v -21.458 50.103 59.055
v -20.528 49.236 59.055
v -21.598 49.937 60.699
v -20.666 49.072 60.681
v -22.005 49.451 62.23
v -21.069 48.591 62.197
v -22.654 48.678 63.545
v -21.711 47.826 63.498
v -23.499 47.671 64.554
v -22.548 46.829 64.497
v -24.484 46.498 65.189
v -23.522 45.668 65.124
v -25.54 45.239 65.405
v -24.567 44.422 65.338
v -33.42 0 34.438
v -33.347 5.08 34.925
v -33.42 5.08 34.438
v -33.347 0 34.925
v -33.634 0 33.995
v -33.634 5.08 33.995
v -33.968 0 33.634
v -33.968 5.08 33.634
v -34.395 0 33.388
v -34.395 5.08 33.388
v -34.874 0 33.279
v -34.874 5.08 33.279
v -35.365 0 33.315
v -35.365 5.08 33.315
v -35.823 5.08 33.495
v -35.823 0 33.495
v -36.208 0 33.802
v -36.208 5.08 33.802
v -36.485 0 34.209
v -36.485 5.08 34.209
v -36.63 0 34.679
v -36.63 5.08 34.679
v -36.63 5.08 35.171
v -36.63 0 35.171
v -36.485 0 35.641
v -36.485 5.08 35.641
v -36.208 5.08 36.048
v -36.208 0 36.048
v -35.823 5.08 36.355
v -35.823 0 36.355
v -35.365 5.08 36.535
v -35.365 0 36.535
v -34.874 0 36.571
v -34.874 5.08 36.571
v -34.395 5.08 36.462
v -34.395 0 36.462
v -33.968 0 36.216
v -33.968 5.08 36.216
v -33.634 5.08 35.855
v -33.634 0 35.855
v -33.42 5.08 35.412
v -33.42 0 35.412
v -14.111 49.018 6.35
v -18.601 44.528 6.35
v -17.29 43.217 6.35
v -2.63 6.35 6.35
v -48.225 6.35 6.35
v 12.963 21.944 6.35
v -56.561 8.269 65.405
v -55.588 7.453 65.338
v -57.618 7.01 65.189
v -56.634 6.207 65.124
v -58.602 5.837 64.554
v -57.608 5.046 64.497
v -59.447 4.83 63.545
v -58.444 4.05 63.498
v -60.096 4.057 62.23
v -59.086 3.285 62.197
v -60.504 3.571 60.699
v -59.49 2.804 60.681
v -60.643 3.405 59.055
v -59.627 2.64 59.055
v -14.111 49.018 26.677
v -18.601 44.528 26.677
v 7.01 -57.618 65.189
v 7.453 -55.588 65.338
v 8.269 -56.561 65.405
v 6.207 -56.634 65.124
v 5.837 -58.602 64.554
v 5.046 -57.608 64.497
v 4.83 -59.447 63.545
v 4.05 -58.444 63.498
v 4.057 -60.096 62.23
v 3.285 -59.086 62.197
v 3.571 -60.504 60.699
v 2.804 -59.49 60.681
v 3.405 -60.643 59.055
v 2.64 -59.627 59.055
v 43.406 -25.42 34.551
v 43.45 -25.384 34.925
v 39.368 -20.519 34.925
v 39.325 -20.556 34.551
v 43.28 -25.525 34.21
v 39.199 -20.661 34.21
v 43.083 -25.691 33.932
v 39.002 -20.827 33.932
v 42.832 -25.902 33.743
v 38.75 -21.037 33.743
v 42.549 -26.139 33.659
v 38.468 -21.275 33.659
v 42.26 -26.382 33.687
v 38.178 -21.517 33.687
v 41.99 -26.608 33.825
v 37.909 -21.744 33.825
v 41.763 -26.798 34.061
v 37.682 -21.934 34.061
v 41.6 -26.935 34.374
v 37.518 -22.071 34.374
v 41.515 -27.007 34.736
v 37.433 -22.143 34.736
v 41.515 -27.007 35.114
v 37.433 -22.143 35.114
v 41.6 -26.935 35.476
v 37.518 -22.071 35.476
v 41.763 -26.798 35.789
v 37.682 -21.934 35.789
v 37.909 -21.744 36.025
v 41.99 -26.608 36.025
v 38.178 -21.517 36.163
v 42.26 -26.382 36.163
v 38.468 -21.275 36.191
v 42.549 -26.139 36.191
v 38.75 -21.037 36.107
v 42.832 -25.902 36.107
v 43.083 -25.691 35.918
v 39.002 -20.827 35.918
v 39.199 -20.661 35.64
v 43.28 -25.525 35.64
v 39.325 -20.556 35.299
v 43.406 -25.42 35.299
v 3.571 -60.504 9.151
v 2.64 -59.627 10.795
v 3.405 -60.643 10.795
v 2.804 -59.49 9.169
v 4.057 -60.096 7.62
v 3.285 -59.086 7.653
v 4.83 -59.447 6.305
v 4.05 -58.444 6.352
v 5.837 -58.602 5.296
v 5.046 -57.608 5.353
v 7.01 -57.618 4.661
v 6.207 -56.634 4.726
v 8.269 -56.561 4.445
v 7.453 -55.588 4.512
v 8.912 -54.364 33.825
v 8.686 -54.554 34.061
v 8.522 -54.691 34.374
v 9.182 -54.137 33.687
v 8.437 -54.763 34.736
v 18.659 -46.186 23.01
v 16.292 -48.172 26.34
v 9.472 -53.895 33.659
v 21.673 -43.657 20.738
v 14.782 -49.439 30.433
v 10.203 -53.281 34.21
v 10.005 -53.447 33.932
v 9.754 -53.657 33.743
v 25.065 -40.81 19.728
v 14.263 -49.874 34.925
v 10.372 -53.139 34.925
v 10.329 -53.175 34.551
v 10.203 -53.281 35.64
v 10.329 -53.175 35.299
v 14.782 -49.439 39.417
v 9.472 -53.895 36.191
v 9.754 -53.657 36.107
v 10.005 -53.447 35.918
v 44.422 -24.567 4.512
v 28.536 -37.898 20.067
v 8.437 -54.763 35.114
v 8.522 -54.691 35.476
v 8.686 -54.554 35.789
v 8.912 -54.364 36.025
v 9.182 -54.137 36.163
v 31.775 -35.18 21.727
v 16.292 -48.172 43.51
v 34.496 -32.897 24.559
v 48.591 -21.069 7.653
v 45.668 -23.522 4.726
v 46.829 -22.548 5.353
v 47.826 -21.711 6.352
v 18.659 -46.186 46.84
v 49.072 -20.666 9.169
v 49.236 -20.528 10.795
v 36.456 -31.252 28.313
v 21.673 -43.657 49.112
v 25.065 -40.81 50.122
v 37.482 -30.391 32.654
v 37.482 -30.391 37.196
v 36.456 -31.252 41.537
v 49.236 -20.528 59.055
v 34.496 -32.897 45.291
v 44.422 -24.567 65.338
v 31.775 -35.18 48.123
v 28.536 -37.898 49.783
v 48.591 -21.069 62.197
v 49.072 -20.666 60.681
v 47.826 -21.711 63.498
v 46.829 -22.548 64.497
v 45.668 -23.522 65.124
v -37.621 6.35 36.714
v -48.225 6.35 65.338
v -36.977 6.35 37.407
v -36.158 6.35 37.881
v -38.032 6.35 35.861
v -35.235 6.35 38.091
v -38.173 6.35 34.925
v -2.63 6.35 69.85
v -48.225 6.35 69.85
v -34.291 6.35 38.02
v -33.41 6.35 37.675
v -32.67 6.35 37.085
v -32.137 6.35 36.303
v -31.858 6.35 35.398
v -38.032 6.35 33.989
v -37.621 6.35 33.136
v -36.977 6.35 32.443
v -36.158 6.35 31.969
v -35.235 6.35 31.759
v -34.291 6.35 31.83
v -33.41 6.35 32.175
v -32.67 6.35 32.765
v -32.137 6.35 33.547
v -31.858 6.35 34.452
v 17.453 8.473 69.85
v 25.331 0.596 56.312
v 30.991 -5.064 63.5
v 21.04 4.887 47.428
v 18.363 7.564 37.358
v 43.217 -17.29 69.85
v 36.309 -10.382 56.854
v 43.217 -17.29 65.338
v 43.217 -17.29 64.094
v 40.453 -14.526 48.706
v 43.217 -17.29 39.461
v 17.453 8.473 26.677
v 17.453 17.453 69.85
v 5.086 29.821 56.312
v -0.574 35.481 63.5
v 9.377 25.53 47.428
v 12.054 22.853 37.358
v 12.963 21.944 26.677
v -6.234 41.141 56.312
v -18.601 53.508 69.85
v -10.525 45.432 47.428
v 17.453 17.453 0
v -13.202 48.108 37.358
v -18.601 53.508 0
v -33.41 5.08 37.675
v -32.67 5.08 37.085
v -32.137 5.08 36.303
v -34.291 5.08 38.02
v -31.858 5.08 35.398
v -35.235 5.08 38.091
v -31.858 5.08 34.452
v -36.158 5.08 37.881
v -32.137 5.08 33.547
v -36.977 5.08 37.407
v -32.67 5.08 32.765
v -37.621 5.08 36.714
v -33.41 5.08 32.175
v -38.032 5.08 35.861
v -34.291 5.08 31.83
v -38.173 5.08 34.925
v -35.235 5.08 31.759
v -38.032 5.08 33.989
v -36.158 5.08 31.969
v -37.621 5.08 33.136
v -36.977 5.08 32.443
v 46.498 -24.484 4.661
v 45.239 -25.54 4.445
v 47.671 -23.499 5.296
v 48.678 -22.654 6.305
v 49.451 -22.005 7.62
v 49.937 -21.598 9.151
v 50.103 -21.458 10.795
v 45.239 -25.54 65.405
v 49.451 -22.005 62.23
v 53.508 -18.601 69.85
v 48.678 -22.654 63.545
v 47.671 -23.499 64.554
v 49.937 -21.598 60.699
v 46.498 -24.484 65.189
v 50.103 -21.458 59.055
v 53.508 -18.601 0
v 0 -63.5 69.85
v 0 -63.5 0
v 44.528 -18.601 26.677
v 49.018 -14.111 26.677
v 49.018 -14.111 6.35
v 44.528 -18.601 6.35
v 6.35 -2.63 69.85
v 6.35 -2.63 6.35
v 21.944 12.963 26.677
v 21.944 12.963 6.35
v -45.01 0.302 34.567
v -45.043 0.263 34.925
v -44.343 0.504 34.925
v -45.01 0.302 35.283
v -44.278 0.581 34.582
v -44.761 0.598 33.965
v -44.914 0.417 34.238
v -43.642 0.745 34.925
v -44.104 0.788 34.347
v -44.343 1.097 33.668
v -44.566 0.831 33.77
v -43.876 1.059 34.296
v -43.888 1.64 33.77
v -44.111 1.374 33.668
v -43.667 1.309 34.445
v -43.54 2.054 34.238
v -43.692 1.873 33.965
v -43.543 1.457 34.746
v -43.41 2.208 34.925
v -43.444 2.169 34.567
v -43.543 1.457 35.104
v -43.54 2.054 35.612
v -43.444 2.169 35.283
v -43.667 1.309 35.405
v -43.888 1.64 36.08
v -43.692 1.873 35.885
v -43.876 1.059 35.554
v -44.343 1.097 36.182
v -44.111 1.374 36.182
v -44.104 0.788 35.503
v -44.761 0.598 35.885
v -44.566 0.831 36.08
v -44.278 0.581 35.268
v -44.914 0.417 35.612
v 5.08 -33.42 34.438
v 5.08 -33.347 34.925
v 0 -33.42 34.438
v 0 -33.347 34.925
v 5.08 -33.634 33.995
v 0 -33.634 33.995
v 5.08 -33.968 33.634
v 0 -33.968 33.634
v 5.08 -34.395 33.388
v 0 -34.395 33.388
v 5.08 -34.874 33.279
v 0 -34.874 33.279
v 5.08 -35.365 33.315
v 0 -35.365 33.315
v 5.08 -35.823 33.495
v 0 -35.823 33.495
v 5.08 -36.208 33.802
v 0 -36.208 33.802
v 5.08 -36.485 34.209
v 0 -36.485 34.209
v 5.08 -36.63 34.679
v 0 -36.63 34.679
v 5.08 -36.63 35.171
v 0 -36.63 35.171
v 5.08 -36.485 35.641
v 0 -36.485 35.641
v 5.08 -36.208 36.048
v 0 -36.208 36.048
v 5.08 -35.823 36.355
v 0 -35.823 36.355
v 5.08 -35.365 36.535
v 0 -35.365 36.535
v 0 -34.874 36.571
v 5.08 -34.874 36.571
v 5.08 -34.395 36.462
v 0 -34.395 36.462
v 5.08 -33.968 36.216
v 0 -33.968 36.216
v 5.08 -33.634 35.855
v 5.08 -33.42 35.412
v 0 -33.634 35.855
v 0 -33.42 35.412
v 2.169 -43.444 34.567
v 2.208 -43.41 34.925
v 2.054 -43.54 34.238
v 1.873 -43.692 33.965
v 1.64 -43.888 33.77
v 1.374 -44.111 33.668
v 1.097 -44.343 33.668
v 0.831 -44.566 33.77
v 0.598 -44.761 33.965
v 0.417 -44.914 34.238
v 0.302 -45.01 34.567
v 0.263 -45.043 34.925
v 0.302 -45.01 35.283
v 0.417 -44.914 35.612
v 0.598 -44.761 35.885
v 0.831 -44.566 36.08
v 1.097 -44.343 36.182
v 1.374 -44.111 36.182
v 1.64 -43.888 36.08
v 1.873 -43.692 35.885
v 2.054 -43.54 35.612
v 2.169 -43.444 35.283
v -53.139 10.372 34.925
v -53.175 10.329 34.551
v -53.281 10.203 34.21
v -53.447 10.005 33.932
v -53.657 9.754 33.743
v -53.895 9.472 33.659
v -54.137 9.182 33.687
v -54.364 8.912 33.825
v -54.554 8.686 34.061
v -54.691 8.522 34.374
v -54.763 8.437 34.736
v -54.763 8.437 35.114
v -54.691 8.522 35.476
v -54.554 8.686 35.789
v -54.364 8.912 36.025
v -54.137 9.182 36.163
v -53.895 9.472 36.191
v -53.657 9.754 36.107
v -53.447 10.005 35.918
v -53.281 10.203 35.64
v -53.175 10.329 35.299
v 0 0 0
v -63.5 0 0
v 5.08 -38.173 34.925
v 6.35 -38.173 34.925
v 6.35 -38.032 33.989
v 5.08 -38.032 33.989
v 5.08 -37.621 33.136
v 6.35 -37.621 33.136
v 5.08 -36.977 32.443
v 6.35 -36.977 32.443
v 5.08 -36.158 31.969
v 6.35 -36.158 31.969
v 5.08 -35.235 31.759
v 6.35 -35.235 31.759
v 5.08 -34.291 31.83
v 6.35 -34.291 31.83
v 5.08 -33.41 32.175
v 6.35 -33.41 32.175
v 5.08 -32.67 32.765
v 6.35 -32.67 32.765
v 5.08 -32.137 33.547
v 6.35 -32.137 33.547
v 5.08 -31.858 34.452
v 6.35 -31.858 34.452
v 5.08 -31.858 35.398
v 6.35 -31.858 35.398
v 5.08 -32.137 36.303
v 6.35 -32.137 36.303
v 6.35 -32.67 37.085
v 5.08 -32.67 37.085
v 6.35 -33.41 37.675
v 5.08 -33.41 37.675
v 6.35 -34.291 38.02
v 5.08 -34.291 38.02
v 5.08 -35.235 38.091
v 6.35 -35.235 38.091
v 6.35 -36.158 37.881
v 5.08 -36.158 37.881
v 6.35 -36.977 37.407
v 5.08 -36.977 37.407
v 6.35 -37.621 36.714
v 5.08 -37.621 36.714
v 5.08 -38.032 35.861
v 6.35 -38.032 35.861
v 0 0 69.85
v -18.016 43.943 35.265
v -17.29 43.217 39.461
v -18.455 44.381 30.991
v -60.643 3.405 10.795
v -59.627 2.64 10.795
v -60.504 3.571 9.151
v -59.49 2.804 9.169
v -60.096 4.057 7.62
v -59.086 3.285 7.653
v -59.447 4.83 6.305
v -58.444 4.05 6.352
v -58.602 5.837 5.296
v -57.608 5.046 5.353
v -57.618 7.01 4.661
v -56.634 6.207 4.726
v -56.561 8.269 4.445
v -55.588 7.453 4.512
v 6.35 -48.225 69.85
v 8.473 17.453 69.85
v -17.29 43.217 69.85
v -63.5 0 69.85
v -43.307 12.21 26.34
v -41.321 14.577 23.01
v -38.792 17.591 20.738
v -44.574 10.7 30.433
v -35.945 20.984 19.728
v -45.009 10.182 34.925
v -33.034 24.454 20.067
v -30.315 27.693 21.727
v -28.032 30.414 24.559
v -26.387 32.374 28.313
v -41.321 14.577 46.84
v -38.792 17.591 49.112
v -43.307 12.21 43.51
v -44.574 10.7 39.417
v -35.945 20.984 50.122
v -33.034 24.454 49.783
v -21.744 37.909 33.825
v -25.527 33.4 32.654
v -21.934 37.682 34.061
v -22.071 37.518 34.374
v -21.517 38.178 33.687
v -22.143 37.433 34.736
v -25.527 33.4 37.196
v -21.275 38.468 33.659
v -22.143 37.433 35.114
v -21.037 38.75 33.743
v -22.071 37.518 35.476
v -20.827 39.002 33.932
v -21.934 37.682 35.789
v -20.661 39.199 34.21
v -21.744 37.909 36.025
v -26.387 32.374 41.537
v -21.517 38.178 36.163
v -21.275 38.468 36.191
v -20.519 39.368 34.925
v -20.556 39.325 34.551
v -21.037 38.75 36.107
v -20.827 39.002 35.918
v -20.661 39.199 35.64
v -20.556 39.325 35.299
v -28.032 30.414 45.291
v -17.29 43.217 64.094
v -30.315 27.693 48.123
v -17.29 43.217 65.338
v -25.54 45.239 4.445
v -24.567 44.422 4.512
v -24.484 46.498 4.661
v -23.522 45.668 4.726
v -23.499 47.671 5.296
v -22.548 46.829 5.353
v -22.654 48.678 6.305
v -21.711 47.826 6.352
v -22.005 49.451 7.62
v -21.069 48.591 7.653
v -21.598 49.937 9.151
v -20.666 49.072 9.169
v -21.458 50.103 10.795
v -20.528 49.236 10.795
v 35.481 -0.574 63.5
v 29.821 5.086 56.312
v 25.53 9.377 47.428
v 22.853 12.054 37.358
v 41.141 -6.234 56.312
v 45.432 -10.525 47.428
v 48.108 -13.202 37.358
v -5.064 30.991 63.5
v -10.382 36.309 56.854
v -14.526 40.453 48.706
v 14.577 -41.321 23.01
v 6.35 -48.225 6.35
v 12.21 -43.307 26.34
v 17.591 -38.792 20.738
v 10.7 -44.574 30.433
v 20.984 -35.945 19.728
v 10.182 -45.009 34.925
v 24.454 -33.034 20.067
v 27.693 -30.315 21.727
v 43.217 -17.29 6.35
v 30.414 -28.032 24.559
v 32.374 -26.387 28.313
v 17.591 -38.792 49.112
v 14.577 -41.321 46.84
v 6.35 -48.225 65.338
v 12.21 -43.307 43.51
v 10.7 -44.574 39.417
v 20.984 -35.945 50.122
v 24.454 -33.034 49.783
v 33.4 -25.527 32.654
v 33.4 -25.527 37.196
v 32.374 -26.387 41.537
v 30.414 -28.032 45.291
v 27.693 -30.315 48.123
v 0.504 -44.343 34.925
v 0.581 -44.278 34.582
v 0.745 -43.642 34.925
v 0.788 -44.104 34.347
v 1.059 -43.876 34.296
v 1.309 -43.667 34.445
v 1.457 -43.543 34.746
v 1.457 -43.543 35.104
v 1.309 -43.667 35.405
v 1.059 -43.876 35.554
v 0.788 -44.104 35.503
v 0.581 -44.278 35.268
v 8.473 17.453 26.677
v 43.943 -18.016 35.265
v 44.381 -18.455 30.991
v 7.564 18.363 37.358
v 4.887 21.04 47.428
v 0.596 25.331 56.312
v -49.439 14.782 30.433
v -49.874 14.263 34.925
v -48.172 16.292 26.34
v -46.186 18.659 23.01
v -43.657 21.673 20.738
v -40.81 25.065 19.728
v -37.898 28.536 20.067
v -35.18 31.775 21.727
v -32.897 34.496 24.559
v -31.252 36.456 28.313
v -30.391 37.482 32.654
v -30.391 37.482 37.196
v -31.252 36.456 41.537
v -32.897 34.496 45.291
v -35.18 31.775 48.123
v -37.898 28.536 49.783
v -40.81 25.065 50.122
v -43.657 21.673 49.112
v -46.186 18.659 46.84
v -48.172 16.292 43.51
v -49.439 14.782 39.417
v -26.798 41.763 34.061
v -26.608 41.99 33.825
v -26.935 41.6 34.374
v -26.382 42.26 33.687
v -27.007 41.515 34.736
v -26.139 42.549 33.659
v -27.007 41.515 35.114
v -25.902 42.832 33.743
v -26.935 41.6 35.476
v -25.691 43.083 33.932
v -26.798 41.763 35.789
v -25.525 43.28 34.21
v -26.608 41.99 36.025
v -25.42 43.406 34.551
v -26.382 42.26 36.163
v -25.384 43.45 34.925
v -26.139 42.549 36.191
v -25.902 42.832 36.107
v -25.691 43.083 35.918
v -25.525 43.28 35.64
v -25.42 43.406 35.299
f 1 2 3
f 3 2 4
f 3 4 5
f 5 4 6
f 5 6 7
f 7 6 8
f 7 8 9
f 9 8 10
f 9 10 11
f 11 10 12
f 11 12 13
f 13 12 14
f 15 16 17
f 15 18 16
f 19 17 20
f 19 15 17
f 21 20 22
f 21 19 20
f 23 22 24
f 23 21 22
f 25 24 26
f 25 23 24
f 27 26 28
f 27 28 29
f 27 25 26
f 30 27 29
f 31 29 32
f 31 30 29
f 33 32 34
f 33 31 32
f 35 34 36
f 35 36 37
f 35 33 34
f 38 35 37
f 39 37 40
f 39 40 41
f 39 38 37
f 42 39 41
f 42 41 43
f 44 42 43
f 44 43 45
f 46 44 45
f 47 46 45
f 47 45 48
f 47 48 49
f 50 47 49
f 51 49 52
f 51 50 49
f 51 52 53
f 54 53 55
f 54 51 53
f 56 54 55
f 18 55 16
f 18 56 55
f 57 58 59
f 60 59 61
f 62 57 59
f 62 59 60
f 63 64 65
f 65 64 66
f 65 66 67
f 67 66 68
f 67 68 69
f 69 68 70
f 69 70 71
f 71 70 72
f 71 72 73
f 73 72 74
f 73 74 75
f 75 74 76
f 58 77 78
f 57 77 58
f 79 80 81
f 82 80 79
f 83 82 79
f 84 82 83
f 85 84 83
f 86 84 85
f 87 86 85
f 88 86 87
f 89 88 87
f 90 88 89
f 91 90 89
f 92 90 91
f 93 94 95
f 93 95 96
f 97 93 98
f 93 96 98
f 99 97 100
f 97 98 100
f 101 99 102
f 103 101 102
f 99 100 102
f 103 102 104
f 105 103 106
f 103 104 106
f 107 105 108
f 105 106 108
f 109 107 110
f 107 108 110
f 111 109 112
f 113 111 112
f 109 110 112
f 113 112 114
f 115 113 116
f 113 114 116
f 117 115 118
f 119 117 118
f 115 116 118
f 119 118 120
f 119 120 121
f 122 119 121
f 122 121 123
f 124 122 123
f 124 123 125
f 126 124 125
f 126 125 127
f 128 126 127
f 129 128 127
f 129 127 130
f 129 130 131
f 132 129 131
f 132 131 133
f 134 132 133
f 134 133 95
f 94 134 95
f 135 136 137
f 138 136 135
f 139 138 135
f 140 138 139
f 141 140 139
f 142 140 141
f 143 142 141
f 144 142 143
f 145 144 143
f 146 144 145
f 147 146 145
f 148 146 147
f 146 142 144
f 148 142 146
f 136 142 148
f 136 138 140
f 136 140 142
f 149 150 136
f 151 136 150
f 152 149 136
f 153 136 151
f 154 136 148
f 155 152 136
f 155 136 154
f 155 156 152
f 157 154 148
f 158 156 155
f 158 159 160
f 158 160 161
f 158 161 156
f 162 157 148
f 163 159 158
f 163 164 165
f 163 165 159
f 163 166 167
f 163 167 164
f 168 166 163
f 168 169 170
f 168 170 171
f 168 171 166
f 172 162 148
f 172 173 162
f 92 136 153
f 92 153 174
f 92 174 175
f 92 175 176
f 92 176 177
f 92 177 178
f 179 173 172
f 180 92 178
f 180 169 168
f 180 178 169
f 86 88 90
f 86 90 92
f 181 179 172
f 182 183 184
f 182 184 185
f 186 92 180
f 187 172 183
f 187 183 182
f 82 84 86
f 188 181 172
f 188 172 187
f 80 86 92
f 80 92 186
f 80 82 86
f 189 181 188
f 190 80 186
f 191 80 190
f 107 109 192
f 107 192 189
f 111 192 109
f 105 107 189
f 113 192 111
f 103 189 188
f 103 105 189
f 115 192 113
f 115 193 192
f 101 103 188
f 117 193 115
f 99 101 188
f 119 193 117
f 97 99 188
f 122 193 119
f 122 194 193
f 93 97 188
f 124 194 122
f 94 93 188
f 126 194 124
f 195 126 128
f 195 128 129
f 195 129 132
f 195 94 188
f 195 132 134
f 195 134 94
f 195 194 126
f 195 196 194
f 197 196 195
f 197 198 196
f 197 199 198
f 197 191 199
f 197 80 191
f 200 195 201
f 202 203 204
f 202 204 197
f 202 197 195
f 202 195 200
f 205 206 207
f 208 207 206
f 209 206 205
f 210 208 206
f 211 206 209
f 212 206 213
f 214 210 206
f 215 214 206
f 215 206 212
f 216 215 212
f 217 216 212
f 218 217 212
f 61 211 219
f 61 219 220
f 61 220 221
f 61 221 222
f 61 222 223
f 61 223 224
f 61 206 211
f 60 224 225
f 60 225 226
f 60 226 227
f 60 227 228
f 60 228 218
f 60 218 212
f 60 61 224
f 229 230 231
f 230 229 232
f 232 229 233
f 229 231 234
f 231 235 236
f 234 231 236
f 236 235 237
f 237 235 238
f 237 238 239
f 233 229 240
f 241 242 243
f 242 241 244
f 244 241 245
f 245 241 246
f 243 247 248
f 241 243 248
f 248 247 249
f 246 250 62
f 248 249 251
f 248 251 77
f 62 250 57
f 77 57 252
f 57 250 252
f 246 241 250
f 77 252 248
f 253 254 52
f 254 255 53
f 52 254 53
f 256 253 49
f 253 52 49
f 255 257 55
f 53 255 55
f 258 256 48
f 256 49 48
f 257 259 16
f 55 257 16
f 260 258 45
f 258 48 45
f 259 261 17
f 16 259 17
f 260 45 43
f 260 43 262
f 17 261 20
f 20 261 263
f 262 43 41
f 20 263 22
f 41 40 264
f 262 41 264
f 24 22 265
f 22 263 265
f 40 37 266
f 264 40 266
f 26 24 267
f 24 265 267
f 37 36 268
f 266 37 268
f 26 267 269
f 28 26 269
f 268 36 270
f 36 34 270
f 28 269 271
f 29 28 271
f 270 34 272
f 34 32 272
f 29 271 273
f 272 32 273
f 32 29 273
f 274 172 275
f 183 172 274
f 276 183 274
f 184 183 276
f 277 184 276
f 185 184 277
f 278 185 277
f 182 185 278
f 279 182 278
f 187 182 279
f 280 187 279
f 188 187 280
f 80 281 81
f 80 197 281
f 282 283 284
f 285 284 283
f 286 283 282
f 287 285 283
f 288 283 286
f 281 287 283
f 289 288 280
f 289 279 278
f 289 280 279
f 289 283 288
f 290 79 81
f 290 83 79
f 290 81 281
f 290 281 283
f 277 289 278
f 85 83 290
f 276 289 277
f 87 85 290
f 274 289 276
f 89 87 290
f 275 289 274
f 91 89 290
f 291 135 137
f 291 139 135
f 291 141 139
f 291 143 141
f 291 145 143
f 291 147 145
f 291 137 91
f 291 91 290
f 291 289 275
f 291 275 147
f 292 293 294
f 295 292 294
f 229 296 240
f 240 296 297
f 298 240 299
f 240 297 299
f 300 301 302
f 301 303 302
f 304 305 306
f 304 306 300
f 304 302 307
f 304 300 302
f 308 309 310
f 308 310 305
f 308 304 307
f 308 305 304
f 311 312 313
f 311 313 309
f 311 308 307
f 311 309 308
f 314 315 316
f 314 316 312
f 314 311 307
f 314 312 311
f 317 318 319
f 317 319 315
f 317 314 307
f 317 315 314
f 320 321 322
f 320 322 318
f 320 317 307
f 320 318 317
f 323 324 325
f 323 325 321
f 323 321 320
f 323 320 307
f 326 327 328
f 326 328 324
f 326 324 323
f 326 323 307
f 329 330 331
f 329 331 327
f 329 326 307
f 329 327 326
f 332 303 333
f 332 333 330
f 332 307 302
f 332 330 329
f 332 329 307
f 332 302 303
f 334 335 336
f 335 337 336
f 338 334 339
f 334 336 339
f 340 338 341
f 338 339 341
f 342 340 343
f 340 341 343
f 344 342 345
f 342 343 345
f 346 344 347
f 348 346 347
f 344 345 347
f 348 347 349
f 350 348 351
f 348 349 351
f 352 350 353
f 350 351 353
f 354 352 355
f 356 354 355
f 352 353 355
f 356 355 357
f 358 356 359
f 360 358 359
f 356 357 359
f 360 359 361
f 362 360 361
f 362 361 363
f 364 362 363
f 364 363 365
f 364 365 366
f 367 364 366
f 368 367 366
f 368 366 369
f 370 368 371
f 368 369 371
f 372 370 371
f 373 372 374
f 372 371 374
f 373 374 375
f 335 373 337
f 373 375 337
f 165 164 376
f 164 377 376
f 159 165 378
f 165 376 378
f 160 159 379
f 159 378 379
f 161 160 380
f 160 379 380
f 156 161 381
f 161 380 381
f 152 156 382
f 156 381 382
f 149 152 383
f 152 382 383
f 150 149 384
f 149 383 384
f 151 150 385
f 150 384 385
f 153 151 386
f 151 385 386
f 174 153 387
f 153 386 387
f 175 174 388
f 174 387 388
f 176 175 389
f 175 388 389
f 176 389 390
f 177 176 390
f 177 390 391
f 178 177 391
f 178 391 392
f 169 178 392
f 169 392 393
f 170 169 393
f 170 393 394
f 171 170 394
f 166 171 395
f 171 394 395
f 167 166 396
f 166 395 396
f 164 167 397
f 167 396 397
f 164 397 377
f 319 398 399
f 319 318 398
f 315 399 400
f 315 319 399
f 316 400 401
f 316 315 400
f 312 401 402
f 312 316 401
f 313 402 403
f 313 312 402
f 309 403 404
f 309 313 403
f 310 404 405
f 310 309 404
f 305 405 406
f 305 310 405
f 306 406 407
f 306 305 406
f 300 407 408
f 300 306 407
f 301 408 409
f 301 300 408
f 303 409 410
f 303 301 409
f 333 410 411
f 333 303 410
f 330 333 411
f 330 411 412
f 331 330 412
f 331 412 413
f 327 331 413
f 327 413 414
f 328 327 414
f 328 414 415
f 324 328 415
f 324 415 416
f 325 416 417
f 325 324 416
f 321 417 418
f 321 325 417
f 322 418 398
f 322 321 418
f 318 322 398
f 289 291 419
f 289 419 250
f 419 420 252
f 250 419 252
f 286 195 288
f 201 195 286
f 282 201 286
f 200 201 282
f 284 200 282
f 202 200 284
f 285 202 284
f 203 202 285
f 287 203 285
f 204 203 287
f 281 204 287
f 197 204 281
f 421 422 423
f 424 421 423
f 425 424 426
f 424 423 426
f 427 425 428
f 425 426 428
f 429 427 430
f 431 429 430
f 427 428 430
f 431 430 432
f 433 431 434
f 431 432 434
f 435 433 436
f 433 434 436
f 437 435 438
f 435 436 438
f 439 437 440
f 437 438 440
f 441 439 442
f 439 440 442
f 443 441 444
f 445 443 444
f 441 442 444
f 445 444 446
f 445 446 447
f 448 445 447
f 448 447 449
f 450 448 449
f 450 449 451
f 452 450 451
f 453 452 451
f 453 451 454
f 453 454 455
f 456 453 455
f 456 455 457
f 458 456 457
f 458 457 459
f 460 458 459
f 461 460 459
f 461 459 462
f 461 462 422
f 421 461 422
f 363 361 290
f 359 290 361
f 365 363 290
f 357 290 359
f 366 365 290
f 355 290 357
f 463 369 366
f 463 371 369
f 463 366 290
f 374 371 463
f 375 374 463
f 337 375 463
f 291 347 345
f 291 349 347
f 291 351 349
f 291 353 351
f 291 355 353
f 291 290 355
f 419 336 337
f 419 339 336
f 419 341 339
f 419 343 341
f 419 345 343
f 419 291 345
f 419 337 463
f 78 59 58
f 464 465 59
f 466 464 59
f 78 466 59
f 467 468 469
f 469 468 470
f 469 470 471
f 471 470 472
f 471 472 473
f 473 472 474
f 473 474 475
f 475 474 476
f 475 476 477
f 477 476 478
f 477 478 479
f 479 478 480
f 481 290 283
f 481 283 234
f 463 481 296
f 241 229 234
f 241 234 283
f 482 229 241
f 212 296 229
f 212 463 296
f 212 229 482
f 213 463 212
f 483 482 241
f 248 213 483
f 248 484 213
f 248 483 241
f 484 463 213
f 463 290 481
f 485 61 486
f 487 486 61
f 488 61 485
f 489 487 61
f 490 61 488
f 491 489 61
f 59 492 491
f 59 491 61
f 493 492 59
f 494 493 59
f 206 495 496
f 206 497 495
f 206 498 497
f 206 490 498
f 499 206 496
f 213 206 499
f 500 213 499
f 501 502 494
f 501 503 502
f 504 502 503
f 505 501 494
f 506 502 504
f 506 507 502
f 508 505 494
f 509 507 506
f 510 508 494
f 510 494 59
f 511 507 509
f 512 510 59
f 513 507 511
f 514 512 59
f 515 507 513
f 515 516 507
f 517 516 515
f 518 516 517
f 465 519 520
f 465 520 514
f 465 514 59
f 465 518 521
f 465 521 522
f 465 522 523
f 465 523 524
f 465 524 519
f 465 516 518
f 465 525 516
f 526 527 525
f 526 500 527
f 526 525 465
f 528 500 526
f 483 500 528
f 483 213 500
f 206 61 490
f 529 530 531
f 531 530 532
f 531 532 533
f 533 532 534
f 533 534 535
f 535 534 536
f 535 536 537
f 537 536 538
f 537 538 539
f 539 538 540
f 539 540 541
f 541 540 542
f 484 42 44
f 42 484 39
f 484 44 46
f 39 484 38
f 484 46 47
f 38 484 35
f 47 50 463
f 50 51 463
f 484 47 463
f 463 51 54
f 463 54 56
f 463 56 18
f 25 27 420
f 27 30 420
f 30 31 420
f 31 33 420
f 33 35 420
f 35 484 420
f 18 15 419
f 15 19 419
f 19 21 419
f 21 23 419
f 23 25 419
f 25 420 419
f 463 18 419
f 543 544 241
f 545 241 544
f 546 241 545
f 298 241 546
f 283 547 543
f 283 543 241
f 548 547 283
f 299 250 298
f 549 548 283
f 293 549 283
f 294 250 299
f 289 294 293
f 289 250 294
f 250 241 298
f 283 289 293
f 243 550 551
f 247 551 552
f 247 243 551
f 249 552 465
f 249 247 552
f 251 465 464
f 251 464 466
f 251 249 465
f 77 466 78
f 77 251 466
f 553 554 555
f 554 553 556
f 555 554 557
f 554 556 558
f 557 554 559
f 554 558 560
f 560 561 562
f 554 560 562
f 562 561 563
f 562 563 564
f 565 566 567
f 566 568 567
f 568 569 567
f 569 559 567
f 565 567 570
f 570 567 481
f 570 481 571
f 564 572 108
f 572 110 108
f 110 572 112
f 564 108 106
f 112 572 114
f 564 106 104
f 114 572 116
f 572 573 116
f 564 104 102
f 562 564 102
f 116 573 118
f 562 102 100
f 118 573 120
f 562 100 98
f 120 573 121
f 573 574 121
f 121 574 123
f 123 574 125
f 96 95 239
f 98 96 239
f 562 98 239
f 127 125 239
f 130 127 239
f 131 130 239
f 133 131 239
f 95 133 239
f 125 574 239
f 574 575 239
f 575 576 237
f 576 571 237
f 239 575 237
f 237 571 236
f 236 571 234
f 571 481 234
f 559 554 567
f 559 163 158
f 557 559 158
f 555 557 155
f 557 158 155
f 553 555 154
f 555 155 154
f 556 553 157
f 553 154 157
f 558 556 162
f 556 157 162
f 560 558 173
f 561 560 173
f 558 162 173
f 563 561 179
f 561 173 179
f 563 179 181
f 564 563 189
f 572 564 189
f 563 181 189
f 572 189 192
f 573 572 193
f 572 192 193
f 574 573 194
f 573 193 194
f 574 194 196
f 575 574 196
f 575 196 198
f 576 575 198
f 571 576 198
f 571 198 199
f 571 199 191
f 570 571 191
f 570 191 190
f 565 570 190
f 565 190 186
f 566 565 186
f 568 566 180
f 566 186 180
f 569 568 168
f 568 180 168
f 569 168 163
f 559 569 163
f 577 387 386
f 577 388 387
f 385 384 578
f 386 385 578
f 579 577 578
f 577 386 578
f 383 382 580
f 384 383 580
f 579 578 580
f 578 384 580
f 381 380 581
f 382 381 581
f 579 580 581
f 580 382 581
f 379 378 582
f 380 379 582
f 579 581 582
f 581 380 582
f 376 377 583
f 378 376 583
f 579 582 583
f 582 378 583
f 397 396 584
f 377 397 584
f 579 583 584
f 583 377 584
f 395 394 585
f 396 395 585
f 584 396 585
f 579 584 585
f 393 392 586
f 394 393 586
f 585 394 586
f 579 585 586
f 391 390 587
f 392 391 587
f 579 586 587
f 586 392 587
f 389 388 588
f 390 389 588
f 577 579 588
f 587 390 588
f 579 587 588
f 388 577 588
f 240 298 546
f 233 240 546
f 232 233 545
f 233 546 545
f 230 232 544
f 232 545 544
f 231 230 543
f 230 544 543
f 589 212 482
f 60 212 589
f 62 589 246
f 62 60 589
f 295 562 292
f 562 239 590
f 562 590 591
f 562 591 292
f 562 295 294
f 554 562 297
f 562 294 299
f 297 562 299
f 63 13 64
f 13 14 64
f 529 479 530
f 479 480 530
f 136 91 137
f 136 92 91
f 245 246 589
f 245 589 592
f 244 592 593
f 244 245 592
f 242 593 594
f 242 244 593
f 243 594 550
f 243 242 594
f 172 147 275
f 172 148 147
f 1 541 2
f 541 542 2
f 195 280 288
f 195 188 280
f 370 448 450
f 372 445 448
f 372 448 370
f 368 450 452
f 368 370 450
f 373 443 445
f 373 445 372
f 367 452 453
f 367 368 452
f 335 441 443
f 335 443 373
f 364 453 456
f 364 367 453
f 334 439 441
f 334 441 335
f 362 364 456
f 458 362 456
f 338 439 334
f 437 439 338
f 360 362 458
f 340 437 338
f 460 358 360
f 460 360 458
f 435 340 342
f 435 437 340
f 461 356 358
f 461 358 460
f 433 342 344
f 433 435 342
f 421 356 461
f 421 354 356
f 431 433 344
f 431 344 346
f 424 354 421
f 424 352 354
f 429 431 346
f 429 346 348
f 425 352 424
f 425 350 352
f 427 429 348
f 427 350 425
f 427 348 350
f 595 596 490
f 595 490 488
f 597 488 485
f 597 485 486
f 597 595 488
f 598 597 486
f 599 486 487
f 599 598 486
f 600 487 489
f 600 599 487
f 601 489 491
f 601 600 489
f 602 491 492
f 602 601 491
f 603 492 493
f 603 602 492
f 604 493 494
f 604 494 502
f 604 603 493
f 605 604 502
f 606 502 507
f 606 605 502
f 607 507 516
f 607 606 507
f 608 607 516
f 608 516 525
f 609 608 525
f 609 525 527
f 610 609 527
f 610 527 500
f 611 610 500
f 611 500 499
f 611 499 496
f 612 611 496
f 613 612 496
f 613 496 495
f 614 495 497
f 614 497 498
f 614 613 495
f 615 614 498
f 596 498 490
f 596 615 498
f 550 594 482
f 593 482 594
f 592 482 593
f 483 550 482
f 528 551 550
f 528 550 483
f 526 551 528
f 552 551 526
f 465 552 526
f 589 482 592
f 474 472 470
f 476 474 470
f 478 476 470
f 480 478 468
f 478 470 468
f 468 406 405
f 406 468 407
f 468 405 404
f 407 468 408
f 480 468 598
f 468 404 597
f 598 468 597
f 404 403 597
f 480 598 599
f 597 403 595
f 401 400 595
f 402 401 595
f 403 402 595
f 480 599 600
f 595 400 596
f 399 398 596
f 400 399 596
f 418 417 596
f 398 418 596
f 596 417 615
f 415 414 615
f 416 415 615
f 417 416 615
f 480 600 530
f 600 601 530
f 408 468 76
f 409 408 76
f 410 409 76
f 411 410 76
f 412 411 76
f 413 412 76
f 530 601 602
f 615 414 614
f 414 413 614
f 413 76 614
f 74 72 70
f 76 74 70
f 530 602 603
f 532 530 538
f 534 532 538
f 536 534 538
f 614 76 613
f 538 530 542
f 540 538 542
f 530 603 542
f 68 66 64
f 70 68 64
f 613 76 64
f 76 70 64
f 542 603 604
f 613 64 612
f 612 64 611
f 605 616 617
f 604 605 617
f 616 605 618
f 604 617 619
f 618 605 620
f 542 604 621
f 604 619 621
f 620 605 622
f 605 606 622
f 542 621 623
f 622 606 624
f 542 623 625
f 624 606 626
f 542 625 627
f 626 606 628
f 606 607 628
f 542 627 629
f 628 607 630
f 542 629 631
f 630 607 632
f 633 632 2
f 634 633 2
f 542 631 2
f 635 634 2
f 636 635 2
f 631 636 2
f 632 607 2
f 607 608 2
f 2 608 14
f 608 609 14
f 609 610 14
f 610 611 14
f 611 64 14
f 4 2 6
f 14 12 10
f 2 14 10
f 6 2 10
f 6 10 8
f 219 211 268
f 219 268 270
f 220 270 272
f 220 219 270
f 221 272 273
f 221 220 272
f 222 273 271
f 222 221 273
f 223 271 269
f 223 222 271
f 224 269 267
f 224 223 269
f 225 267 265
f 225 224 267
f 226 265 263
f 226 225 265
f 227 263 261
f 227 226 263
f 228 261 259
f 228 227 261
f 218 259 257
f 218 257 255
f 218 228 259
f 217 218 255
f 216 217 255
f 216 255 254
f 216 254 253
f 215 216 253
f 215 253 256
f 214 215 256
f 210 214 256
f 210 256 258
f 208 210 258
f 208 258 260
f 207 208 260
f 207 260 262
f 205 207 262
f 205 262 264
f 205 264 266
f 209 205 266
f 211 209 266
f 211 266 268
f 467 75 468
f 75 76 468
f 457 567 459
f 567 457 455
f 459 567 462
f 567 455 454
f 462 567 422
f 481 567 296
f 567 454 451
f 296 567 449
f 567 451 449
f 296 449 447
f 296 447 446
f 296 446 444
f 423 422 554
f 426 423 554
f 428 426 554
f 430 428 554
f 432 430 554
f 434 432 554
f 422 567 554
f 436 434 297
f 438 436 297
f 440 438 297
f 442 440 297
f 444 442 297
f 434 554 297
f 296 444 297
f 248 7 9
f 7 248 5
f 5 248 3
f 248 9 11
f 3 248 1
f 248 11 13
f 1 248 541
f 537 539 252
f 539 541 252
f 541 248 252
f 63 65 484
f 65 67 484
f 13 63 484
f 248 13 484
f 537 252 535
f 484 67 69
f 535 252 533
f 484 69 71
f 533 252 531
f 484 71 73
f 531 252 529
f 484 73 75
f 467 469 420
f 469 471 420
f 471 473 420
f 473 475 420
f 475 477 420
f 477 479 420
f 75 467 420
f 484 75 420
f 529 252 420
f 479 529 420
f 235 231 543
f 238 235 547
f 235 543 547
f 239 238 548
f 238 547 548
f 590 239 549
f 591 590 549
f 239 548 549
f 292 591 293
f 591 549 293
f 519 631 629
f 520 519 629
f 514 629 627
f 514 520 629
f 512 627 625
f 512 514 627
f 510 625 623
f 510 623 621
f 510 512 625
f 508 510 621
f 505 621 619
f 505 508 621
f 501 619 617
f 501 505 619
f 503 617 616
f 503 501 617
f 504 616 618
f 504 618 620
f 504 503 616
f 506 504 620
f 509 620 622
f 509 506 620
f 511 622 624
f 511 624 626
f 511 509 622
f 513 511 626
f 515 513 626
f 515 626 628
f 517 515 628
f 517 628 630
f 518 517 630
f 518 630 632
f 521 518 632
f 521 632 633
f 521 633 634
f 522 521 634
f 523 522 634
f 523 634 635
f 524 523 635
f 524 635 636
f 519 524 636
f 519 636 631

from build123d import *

# Parameters (mm, degrees)
F1_DEPTH        = 69.85
F3_DEPTH        = 1.27
F3_TAPER        = 3
F4_T            = 6.35
F4_T3_DEPTH     = 60.96
F4_T5_DEPTH     = 60.96
F4_T7_DEPTH     = 60.96
F4_T10_ANGLE    = 90.000000001
F4_T12_ANGLE    = 90.000000001
F4_T14_ANGLE    = 90.000000001
F4_T16_ANGLE    = 90.000000001
F6_DEPTH        = 6.35
F8_D            = 2.54
F8_DEPTH        = 12.7
F8_TIP          = 0.7630929862
F7_R            = 15.24
F9_DEPTH        = 6.3499999999
F11_D           = 3.302
F11_DEPTH       = 12.7
F11_CBORE_D     = 6.35
F11_CBORE_DEPTH = 1.27
F11_TIP         = 0.992020882
F13_ANGLE       = 180


# Not quite as in the source:
# - a shell that OpenCascade refuses in one call is made with other operations: the cavity is built on its own and cut out


with BuildPart() as f1:
    # F0 (on Top) → F1 (new body)
    with BuildSketch(Plane.XY):
        Polygon((0, 63.5), (0, 0), (17.4534594442, -17.4534594442), (53.5082043519, 18.6012854634), align=None)
    extrude(amount=-F1_DEPTH)

    # F2 (on face) → F3 (cut)
    with BuildSketch(Plane(origin=(31.2676461581, 37.2633296409, 0), x_dir=(-0.7660444431, 0.6427876097, 0), z_dir=(0.6427876097, 0.7660444431, 0))):
        with BuildLine():
            ThreePointArc((-24.5879867849, -59.055), (-22.7281148454, -63.5451280605), (-18.2379867849, -65.405))
            Line((-18.2379867849, -65.405), (30.0220132151, -65.405))
            ThreePointArc((30.0220132151, -65.405), (34.5121412756, -63.5451280605), (36.3720132151, -59.055))
            Line((36.3720132151, -59.055), (36.3720132151, -10.795))
            ThreePointArc((36.3720132151, -10.795), (34.5121412756, -6.3048719395), (30.0220132151, -4.445))
            Line((30.0220132151, -4.445), (-18.2379867849, -4.445))
            ThreePointArc((-18.2379867849, -4.445), (-22.7281148454, -6.3048719395), (-24.5879867849, -10.795))
            Line((-24.5879867849, -10.795), (-24.5879867849, -59.055))
        make_face()
    extrude(amount=-F3_DEPTH, taper=F3_TAPER, mode=Mode.SUBTRACT)

    # F4: shell of thickness 6.35, made by hand


with BuildPart() as f4_core1:
    # F4_t2: copy of F1
    add(f1.part)

    # the walls: a layer under each face that stays
    f4_faces = [f4_core1.faces().sort_by_distance(p)[0] for p in [
        (49.6861897553, 21.8083365017, -64.8607142857),
        (35.480831898, 0.5739130096, -34.925),
        (26.7541021759, 23.0232702779, 0),
        (0, 31.75, -34.925),
        (48.2521957288, 22.1826667317, -63.5215962965),
        (26.3459320438, 40.5642045103, -65.3717210602),
        (4.4396683587, 58.9457422889, -63.5215962965),
        (3.0223905645, 60.1349795634, -34.925),
        (4.4396683587, 58.9457422889, -6.3284037035),
        (26.3459320438, 40.5642045103, -4.4782789398),
        (48.2521957288, 22.1826667317, -6.3284037035),
        (49.6694735231, 20.9934294573, -34.925),
        (8.7267297221, -8.7267297221, -34.925),
        (25.9377619116, 40.0777662889, -34.925),
    ]]
    thicken(f4_faces, amount=-F4_T, mode=Mode.SUBTRACT)

    # F4_s4 → F4_t3 (cut)
    with BuildSketch(Plane(origin=(18.8354906441, -15.8048532525, 0), x_dir=(0, 0, 1), z_dir=(-0.7660444431, 0.6427876097, 0))):
        Polygon((-65.2750291449, 47.4406454713), (-71.679739666, 47.0414888159), (-71.3643671189, 41.0238221381), (-65.3384421203, 41.0238221381), align=None)
    extrude(amount=F4_T3_DEPTH, mode=Mode.SUBTRACT)

    # F4_s6 → F4_t5 (cut)
    with BuildSketch(Plane.XY.offset(-65.405)):
        Polygon((2.7312439473, 59.63757862), (-2.4316219096, 63.4486754488), (-6.0581141021, 58.636157764), (-1.4419877423, 54.762767838), align=None)
        Polygon((49.2301862972, 20.6203332441), (53.8799062493, 16.1976929397), (49.7702352824, 11.7906103863), (45.1541089225, 15.6640003123), align=None)
    extrude(amount=F4_T5_DEPTH, mode=Mode.SUBTRACT)

    # F4_s8 → F4_t7 (cut)
    with BuildSketch(Plane(origin=(-27.8625786085, 23.379479434, 0), x_dir=(0, 0, 1), z_dir=(0.7660444431, -0.6427876097, 0))):
        Polygon((-4.5749708551, -47.4406454713), (1.829739666, -47.0414888159), (1.514367119, -41.0238221381), (-4.5115578797, -41.0238221381), align=None)
    extrude(amount=F4_T7_DEPTH, mode=Mode.SUBTRACT)

    # F4_s9 → F4_t10 (revolve, cut)
    with BuildSketch(Plane.XY.offset(-59.055)):
        Polygon((49.2301862972, 20.6203332441), (53.8799062493, 16.1976929397), (49.7702352824, 11.7906103863), (45.1541089225, 15.6640003123), align=None)
    revolve(axis=Axis((44.4224143241, 24.5673012672, -59.055), (0.6427876097, 0.7660444431, 0)), revolution_arc=F4_T10_ANGLE, mode=Mode.SUBTRACT)

    # F4_s11 → F4_t12 (revolve, cut)
    with BuildSketch(Plane(origin=(-22.9981963947, 19.2977781125, 0), x_dir=(0, 0, 1), z_dir=(0.7660444431, -0.6427876097, 0))):
        Polygon((-65.2750291449, -47.4406454713), (-71.679739666, -47.0414888159), (-71.364367119, -41.0238221381), (-65.3384421203, -41.0238221381), align=None)
    revolve(axis=Axis((7.4531094992, 55.5882313107, -59.055), (0.6427876097, 0.7660444431, 0)), revolution_arc=F4_T12_ANGLE, mode=Mode.SUBTRACT)

    # F4_s13 → F4_t14 (revolve, cut)
    with BuildSketch(Plane.XY.offset(-10.795)):
        Polygon((2.7312439473, 59.63757862), (-2.4316219096, 63.4486754488), (-6.0581141021, 58.636157764), (-1.4419877423, 54.762767838), align=None)
    revolve(axis=Axis((7.4531094992, 55.5882313107, -10.795), (0.6427876097, 0.7660444431, 0)), revolution_arc=F4_T14_ANGLE, mode=Mode.SUBTRACT)

    # F4_s15 → F4_t16 (revolve, cut)
    with BuildSketch(Plane(origin=(13.9711084303, -11.723151931, 0), x_dir=(0, 0, 1), z_dir=(-0.7660444431, 0.6427876097, 0))):
        Polygon((-4.5749708551, 47.4406454713), (1.829739666, 47.0414888159), (1.514367119, 41.0238221381), (-4.5115578797, 41.0238221381), align=None)
    revolve(axis=Axis((44.4224143241, 24.5673012672, -10.795), (0.6427876097, 0.7660444431, 0)), revolution_arc=F4_T16_ANGLE, mode=Mode.SUBTRACT)


with BuildPart() as f1_1:
    add(f1.part)

    # what is left inside the walls is the cavity
    f4_cavity = [f4_core1.part.solids().sort_by_distance(p)[0] for p in [
        (24.742436, 32.708534, -27.516667),
    ]]
    add(f4_cavity, mode=Mode.SUBTRACT)

    # F5 (on face) → F6 (cut, through all)
    with BuildSketch(Plane(origin=(17.4534594442, -17.4534594442, 0), x_dir=(0.7071067812, 0.7071067812, 0), z_dir=(0.7071067812, -0.7071067812, 0))):
        with BuildLine():
            Line((44.6391092363, -6.35), (6.35, -6.35))
            Line((6.35, -6.35), (6.35, -26.6769132179))
            ThreePointArc((6.35, -26.6769132179), (11.4220747655, -47.42814024), (25.4945546181, -63.5))
            ThreePointArc((25.4945546181, -63.5), (39.5670344708, -47.42814024), (44.6391092363, -26.6769132179))
            Line((44.6391092363, -26.6769132179), (44.6391092363, -6.35))
        make_face()
    extrude(amount=-F6_DEPTH, mode=Mode.SUBTRACT)

    # F8
    with Locations(Plane(origin=(30.4513058938, 36.2904531982, 0), x_dir=(-0.7660444431, 0.6427876097, 0), z_dir=(0.6427876097, 0.7660444431, 0))):
        with Locations((27.4820132151, -34.925), (-15.6979867849, -34.925)):
            Hole(F8_D / 2, depth=F8_DEPTH)
            with Locations((0, 0, -(F8_DEPTH + F8_TIP / 2))):  # 118° drill point
                Cone(0, F8_D / 2, F8_TIP, mode=Mode.SUBTRACT)

    # F7 (on face) → F9 (cut, through all)
    with BuildSketch(Plane(origin=(30.4513058938, 36.2904531982, 0), x_dir=(-0.7660444431, 0.6427876097, 0), z_dir=(0.6427876097, 0.7660444431, 0))):
        with Locations((5.8920132151, -34.925)):
            Circle(F7_R)
    extrude(amount=-F9_DEPTH, mode=Mode.SUBTRACT)

    # F11
    with Locations(Plane.YZ.offset(6.35)):
        with Locations((34.9977662889, -34.925)):
            CounterBoreHole(F11_D / 2, F11_CBORE_D / 2, F11_CBORE_DEPTH, depth=F11_DEPTH)
            with Locations((0, 0, -(F11_DEPTH + F11_TIP / 2))):  # 118° drill point
                Cone(0, F11_D / 2, F11_TIP, mode=Mode.SUBTRACT)

    # F12: F1 across face


with BuildPart() as f1_2:
    add(f1_1.part)
    add(f1_1.part.mirror(Plane(origin=(8.7267297221, -8.7267297221, -34.925), x_dir=(0.7071067812, -0.7071067812, 0), z_dir=(-0.7071067812, -0.7071067812, 0))))


with BuildPart() as f1_3:
    # F13: moved
    add(f1_2.part.rotate(Axis((-31.75, 0, 0), (-1, 0, 0)), F13_ANGLE))


solid = f1_3.part
